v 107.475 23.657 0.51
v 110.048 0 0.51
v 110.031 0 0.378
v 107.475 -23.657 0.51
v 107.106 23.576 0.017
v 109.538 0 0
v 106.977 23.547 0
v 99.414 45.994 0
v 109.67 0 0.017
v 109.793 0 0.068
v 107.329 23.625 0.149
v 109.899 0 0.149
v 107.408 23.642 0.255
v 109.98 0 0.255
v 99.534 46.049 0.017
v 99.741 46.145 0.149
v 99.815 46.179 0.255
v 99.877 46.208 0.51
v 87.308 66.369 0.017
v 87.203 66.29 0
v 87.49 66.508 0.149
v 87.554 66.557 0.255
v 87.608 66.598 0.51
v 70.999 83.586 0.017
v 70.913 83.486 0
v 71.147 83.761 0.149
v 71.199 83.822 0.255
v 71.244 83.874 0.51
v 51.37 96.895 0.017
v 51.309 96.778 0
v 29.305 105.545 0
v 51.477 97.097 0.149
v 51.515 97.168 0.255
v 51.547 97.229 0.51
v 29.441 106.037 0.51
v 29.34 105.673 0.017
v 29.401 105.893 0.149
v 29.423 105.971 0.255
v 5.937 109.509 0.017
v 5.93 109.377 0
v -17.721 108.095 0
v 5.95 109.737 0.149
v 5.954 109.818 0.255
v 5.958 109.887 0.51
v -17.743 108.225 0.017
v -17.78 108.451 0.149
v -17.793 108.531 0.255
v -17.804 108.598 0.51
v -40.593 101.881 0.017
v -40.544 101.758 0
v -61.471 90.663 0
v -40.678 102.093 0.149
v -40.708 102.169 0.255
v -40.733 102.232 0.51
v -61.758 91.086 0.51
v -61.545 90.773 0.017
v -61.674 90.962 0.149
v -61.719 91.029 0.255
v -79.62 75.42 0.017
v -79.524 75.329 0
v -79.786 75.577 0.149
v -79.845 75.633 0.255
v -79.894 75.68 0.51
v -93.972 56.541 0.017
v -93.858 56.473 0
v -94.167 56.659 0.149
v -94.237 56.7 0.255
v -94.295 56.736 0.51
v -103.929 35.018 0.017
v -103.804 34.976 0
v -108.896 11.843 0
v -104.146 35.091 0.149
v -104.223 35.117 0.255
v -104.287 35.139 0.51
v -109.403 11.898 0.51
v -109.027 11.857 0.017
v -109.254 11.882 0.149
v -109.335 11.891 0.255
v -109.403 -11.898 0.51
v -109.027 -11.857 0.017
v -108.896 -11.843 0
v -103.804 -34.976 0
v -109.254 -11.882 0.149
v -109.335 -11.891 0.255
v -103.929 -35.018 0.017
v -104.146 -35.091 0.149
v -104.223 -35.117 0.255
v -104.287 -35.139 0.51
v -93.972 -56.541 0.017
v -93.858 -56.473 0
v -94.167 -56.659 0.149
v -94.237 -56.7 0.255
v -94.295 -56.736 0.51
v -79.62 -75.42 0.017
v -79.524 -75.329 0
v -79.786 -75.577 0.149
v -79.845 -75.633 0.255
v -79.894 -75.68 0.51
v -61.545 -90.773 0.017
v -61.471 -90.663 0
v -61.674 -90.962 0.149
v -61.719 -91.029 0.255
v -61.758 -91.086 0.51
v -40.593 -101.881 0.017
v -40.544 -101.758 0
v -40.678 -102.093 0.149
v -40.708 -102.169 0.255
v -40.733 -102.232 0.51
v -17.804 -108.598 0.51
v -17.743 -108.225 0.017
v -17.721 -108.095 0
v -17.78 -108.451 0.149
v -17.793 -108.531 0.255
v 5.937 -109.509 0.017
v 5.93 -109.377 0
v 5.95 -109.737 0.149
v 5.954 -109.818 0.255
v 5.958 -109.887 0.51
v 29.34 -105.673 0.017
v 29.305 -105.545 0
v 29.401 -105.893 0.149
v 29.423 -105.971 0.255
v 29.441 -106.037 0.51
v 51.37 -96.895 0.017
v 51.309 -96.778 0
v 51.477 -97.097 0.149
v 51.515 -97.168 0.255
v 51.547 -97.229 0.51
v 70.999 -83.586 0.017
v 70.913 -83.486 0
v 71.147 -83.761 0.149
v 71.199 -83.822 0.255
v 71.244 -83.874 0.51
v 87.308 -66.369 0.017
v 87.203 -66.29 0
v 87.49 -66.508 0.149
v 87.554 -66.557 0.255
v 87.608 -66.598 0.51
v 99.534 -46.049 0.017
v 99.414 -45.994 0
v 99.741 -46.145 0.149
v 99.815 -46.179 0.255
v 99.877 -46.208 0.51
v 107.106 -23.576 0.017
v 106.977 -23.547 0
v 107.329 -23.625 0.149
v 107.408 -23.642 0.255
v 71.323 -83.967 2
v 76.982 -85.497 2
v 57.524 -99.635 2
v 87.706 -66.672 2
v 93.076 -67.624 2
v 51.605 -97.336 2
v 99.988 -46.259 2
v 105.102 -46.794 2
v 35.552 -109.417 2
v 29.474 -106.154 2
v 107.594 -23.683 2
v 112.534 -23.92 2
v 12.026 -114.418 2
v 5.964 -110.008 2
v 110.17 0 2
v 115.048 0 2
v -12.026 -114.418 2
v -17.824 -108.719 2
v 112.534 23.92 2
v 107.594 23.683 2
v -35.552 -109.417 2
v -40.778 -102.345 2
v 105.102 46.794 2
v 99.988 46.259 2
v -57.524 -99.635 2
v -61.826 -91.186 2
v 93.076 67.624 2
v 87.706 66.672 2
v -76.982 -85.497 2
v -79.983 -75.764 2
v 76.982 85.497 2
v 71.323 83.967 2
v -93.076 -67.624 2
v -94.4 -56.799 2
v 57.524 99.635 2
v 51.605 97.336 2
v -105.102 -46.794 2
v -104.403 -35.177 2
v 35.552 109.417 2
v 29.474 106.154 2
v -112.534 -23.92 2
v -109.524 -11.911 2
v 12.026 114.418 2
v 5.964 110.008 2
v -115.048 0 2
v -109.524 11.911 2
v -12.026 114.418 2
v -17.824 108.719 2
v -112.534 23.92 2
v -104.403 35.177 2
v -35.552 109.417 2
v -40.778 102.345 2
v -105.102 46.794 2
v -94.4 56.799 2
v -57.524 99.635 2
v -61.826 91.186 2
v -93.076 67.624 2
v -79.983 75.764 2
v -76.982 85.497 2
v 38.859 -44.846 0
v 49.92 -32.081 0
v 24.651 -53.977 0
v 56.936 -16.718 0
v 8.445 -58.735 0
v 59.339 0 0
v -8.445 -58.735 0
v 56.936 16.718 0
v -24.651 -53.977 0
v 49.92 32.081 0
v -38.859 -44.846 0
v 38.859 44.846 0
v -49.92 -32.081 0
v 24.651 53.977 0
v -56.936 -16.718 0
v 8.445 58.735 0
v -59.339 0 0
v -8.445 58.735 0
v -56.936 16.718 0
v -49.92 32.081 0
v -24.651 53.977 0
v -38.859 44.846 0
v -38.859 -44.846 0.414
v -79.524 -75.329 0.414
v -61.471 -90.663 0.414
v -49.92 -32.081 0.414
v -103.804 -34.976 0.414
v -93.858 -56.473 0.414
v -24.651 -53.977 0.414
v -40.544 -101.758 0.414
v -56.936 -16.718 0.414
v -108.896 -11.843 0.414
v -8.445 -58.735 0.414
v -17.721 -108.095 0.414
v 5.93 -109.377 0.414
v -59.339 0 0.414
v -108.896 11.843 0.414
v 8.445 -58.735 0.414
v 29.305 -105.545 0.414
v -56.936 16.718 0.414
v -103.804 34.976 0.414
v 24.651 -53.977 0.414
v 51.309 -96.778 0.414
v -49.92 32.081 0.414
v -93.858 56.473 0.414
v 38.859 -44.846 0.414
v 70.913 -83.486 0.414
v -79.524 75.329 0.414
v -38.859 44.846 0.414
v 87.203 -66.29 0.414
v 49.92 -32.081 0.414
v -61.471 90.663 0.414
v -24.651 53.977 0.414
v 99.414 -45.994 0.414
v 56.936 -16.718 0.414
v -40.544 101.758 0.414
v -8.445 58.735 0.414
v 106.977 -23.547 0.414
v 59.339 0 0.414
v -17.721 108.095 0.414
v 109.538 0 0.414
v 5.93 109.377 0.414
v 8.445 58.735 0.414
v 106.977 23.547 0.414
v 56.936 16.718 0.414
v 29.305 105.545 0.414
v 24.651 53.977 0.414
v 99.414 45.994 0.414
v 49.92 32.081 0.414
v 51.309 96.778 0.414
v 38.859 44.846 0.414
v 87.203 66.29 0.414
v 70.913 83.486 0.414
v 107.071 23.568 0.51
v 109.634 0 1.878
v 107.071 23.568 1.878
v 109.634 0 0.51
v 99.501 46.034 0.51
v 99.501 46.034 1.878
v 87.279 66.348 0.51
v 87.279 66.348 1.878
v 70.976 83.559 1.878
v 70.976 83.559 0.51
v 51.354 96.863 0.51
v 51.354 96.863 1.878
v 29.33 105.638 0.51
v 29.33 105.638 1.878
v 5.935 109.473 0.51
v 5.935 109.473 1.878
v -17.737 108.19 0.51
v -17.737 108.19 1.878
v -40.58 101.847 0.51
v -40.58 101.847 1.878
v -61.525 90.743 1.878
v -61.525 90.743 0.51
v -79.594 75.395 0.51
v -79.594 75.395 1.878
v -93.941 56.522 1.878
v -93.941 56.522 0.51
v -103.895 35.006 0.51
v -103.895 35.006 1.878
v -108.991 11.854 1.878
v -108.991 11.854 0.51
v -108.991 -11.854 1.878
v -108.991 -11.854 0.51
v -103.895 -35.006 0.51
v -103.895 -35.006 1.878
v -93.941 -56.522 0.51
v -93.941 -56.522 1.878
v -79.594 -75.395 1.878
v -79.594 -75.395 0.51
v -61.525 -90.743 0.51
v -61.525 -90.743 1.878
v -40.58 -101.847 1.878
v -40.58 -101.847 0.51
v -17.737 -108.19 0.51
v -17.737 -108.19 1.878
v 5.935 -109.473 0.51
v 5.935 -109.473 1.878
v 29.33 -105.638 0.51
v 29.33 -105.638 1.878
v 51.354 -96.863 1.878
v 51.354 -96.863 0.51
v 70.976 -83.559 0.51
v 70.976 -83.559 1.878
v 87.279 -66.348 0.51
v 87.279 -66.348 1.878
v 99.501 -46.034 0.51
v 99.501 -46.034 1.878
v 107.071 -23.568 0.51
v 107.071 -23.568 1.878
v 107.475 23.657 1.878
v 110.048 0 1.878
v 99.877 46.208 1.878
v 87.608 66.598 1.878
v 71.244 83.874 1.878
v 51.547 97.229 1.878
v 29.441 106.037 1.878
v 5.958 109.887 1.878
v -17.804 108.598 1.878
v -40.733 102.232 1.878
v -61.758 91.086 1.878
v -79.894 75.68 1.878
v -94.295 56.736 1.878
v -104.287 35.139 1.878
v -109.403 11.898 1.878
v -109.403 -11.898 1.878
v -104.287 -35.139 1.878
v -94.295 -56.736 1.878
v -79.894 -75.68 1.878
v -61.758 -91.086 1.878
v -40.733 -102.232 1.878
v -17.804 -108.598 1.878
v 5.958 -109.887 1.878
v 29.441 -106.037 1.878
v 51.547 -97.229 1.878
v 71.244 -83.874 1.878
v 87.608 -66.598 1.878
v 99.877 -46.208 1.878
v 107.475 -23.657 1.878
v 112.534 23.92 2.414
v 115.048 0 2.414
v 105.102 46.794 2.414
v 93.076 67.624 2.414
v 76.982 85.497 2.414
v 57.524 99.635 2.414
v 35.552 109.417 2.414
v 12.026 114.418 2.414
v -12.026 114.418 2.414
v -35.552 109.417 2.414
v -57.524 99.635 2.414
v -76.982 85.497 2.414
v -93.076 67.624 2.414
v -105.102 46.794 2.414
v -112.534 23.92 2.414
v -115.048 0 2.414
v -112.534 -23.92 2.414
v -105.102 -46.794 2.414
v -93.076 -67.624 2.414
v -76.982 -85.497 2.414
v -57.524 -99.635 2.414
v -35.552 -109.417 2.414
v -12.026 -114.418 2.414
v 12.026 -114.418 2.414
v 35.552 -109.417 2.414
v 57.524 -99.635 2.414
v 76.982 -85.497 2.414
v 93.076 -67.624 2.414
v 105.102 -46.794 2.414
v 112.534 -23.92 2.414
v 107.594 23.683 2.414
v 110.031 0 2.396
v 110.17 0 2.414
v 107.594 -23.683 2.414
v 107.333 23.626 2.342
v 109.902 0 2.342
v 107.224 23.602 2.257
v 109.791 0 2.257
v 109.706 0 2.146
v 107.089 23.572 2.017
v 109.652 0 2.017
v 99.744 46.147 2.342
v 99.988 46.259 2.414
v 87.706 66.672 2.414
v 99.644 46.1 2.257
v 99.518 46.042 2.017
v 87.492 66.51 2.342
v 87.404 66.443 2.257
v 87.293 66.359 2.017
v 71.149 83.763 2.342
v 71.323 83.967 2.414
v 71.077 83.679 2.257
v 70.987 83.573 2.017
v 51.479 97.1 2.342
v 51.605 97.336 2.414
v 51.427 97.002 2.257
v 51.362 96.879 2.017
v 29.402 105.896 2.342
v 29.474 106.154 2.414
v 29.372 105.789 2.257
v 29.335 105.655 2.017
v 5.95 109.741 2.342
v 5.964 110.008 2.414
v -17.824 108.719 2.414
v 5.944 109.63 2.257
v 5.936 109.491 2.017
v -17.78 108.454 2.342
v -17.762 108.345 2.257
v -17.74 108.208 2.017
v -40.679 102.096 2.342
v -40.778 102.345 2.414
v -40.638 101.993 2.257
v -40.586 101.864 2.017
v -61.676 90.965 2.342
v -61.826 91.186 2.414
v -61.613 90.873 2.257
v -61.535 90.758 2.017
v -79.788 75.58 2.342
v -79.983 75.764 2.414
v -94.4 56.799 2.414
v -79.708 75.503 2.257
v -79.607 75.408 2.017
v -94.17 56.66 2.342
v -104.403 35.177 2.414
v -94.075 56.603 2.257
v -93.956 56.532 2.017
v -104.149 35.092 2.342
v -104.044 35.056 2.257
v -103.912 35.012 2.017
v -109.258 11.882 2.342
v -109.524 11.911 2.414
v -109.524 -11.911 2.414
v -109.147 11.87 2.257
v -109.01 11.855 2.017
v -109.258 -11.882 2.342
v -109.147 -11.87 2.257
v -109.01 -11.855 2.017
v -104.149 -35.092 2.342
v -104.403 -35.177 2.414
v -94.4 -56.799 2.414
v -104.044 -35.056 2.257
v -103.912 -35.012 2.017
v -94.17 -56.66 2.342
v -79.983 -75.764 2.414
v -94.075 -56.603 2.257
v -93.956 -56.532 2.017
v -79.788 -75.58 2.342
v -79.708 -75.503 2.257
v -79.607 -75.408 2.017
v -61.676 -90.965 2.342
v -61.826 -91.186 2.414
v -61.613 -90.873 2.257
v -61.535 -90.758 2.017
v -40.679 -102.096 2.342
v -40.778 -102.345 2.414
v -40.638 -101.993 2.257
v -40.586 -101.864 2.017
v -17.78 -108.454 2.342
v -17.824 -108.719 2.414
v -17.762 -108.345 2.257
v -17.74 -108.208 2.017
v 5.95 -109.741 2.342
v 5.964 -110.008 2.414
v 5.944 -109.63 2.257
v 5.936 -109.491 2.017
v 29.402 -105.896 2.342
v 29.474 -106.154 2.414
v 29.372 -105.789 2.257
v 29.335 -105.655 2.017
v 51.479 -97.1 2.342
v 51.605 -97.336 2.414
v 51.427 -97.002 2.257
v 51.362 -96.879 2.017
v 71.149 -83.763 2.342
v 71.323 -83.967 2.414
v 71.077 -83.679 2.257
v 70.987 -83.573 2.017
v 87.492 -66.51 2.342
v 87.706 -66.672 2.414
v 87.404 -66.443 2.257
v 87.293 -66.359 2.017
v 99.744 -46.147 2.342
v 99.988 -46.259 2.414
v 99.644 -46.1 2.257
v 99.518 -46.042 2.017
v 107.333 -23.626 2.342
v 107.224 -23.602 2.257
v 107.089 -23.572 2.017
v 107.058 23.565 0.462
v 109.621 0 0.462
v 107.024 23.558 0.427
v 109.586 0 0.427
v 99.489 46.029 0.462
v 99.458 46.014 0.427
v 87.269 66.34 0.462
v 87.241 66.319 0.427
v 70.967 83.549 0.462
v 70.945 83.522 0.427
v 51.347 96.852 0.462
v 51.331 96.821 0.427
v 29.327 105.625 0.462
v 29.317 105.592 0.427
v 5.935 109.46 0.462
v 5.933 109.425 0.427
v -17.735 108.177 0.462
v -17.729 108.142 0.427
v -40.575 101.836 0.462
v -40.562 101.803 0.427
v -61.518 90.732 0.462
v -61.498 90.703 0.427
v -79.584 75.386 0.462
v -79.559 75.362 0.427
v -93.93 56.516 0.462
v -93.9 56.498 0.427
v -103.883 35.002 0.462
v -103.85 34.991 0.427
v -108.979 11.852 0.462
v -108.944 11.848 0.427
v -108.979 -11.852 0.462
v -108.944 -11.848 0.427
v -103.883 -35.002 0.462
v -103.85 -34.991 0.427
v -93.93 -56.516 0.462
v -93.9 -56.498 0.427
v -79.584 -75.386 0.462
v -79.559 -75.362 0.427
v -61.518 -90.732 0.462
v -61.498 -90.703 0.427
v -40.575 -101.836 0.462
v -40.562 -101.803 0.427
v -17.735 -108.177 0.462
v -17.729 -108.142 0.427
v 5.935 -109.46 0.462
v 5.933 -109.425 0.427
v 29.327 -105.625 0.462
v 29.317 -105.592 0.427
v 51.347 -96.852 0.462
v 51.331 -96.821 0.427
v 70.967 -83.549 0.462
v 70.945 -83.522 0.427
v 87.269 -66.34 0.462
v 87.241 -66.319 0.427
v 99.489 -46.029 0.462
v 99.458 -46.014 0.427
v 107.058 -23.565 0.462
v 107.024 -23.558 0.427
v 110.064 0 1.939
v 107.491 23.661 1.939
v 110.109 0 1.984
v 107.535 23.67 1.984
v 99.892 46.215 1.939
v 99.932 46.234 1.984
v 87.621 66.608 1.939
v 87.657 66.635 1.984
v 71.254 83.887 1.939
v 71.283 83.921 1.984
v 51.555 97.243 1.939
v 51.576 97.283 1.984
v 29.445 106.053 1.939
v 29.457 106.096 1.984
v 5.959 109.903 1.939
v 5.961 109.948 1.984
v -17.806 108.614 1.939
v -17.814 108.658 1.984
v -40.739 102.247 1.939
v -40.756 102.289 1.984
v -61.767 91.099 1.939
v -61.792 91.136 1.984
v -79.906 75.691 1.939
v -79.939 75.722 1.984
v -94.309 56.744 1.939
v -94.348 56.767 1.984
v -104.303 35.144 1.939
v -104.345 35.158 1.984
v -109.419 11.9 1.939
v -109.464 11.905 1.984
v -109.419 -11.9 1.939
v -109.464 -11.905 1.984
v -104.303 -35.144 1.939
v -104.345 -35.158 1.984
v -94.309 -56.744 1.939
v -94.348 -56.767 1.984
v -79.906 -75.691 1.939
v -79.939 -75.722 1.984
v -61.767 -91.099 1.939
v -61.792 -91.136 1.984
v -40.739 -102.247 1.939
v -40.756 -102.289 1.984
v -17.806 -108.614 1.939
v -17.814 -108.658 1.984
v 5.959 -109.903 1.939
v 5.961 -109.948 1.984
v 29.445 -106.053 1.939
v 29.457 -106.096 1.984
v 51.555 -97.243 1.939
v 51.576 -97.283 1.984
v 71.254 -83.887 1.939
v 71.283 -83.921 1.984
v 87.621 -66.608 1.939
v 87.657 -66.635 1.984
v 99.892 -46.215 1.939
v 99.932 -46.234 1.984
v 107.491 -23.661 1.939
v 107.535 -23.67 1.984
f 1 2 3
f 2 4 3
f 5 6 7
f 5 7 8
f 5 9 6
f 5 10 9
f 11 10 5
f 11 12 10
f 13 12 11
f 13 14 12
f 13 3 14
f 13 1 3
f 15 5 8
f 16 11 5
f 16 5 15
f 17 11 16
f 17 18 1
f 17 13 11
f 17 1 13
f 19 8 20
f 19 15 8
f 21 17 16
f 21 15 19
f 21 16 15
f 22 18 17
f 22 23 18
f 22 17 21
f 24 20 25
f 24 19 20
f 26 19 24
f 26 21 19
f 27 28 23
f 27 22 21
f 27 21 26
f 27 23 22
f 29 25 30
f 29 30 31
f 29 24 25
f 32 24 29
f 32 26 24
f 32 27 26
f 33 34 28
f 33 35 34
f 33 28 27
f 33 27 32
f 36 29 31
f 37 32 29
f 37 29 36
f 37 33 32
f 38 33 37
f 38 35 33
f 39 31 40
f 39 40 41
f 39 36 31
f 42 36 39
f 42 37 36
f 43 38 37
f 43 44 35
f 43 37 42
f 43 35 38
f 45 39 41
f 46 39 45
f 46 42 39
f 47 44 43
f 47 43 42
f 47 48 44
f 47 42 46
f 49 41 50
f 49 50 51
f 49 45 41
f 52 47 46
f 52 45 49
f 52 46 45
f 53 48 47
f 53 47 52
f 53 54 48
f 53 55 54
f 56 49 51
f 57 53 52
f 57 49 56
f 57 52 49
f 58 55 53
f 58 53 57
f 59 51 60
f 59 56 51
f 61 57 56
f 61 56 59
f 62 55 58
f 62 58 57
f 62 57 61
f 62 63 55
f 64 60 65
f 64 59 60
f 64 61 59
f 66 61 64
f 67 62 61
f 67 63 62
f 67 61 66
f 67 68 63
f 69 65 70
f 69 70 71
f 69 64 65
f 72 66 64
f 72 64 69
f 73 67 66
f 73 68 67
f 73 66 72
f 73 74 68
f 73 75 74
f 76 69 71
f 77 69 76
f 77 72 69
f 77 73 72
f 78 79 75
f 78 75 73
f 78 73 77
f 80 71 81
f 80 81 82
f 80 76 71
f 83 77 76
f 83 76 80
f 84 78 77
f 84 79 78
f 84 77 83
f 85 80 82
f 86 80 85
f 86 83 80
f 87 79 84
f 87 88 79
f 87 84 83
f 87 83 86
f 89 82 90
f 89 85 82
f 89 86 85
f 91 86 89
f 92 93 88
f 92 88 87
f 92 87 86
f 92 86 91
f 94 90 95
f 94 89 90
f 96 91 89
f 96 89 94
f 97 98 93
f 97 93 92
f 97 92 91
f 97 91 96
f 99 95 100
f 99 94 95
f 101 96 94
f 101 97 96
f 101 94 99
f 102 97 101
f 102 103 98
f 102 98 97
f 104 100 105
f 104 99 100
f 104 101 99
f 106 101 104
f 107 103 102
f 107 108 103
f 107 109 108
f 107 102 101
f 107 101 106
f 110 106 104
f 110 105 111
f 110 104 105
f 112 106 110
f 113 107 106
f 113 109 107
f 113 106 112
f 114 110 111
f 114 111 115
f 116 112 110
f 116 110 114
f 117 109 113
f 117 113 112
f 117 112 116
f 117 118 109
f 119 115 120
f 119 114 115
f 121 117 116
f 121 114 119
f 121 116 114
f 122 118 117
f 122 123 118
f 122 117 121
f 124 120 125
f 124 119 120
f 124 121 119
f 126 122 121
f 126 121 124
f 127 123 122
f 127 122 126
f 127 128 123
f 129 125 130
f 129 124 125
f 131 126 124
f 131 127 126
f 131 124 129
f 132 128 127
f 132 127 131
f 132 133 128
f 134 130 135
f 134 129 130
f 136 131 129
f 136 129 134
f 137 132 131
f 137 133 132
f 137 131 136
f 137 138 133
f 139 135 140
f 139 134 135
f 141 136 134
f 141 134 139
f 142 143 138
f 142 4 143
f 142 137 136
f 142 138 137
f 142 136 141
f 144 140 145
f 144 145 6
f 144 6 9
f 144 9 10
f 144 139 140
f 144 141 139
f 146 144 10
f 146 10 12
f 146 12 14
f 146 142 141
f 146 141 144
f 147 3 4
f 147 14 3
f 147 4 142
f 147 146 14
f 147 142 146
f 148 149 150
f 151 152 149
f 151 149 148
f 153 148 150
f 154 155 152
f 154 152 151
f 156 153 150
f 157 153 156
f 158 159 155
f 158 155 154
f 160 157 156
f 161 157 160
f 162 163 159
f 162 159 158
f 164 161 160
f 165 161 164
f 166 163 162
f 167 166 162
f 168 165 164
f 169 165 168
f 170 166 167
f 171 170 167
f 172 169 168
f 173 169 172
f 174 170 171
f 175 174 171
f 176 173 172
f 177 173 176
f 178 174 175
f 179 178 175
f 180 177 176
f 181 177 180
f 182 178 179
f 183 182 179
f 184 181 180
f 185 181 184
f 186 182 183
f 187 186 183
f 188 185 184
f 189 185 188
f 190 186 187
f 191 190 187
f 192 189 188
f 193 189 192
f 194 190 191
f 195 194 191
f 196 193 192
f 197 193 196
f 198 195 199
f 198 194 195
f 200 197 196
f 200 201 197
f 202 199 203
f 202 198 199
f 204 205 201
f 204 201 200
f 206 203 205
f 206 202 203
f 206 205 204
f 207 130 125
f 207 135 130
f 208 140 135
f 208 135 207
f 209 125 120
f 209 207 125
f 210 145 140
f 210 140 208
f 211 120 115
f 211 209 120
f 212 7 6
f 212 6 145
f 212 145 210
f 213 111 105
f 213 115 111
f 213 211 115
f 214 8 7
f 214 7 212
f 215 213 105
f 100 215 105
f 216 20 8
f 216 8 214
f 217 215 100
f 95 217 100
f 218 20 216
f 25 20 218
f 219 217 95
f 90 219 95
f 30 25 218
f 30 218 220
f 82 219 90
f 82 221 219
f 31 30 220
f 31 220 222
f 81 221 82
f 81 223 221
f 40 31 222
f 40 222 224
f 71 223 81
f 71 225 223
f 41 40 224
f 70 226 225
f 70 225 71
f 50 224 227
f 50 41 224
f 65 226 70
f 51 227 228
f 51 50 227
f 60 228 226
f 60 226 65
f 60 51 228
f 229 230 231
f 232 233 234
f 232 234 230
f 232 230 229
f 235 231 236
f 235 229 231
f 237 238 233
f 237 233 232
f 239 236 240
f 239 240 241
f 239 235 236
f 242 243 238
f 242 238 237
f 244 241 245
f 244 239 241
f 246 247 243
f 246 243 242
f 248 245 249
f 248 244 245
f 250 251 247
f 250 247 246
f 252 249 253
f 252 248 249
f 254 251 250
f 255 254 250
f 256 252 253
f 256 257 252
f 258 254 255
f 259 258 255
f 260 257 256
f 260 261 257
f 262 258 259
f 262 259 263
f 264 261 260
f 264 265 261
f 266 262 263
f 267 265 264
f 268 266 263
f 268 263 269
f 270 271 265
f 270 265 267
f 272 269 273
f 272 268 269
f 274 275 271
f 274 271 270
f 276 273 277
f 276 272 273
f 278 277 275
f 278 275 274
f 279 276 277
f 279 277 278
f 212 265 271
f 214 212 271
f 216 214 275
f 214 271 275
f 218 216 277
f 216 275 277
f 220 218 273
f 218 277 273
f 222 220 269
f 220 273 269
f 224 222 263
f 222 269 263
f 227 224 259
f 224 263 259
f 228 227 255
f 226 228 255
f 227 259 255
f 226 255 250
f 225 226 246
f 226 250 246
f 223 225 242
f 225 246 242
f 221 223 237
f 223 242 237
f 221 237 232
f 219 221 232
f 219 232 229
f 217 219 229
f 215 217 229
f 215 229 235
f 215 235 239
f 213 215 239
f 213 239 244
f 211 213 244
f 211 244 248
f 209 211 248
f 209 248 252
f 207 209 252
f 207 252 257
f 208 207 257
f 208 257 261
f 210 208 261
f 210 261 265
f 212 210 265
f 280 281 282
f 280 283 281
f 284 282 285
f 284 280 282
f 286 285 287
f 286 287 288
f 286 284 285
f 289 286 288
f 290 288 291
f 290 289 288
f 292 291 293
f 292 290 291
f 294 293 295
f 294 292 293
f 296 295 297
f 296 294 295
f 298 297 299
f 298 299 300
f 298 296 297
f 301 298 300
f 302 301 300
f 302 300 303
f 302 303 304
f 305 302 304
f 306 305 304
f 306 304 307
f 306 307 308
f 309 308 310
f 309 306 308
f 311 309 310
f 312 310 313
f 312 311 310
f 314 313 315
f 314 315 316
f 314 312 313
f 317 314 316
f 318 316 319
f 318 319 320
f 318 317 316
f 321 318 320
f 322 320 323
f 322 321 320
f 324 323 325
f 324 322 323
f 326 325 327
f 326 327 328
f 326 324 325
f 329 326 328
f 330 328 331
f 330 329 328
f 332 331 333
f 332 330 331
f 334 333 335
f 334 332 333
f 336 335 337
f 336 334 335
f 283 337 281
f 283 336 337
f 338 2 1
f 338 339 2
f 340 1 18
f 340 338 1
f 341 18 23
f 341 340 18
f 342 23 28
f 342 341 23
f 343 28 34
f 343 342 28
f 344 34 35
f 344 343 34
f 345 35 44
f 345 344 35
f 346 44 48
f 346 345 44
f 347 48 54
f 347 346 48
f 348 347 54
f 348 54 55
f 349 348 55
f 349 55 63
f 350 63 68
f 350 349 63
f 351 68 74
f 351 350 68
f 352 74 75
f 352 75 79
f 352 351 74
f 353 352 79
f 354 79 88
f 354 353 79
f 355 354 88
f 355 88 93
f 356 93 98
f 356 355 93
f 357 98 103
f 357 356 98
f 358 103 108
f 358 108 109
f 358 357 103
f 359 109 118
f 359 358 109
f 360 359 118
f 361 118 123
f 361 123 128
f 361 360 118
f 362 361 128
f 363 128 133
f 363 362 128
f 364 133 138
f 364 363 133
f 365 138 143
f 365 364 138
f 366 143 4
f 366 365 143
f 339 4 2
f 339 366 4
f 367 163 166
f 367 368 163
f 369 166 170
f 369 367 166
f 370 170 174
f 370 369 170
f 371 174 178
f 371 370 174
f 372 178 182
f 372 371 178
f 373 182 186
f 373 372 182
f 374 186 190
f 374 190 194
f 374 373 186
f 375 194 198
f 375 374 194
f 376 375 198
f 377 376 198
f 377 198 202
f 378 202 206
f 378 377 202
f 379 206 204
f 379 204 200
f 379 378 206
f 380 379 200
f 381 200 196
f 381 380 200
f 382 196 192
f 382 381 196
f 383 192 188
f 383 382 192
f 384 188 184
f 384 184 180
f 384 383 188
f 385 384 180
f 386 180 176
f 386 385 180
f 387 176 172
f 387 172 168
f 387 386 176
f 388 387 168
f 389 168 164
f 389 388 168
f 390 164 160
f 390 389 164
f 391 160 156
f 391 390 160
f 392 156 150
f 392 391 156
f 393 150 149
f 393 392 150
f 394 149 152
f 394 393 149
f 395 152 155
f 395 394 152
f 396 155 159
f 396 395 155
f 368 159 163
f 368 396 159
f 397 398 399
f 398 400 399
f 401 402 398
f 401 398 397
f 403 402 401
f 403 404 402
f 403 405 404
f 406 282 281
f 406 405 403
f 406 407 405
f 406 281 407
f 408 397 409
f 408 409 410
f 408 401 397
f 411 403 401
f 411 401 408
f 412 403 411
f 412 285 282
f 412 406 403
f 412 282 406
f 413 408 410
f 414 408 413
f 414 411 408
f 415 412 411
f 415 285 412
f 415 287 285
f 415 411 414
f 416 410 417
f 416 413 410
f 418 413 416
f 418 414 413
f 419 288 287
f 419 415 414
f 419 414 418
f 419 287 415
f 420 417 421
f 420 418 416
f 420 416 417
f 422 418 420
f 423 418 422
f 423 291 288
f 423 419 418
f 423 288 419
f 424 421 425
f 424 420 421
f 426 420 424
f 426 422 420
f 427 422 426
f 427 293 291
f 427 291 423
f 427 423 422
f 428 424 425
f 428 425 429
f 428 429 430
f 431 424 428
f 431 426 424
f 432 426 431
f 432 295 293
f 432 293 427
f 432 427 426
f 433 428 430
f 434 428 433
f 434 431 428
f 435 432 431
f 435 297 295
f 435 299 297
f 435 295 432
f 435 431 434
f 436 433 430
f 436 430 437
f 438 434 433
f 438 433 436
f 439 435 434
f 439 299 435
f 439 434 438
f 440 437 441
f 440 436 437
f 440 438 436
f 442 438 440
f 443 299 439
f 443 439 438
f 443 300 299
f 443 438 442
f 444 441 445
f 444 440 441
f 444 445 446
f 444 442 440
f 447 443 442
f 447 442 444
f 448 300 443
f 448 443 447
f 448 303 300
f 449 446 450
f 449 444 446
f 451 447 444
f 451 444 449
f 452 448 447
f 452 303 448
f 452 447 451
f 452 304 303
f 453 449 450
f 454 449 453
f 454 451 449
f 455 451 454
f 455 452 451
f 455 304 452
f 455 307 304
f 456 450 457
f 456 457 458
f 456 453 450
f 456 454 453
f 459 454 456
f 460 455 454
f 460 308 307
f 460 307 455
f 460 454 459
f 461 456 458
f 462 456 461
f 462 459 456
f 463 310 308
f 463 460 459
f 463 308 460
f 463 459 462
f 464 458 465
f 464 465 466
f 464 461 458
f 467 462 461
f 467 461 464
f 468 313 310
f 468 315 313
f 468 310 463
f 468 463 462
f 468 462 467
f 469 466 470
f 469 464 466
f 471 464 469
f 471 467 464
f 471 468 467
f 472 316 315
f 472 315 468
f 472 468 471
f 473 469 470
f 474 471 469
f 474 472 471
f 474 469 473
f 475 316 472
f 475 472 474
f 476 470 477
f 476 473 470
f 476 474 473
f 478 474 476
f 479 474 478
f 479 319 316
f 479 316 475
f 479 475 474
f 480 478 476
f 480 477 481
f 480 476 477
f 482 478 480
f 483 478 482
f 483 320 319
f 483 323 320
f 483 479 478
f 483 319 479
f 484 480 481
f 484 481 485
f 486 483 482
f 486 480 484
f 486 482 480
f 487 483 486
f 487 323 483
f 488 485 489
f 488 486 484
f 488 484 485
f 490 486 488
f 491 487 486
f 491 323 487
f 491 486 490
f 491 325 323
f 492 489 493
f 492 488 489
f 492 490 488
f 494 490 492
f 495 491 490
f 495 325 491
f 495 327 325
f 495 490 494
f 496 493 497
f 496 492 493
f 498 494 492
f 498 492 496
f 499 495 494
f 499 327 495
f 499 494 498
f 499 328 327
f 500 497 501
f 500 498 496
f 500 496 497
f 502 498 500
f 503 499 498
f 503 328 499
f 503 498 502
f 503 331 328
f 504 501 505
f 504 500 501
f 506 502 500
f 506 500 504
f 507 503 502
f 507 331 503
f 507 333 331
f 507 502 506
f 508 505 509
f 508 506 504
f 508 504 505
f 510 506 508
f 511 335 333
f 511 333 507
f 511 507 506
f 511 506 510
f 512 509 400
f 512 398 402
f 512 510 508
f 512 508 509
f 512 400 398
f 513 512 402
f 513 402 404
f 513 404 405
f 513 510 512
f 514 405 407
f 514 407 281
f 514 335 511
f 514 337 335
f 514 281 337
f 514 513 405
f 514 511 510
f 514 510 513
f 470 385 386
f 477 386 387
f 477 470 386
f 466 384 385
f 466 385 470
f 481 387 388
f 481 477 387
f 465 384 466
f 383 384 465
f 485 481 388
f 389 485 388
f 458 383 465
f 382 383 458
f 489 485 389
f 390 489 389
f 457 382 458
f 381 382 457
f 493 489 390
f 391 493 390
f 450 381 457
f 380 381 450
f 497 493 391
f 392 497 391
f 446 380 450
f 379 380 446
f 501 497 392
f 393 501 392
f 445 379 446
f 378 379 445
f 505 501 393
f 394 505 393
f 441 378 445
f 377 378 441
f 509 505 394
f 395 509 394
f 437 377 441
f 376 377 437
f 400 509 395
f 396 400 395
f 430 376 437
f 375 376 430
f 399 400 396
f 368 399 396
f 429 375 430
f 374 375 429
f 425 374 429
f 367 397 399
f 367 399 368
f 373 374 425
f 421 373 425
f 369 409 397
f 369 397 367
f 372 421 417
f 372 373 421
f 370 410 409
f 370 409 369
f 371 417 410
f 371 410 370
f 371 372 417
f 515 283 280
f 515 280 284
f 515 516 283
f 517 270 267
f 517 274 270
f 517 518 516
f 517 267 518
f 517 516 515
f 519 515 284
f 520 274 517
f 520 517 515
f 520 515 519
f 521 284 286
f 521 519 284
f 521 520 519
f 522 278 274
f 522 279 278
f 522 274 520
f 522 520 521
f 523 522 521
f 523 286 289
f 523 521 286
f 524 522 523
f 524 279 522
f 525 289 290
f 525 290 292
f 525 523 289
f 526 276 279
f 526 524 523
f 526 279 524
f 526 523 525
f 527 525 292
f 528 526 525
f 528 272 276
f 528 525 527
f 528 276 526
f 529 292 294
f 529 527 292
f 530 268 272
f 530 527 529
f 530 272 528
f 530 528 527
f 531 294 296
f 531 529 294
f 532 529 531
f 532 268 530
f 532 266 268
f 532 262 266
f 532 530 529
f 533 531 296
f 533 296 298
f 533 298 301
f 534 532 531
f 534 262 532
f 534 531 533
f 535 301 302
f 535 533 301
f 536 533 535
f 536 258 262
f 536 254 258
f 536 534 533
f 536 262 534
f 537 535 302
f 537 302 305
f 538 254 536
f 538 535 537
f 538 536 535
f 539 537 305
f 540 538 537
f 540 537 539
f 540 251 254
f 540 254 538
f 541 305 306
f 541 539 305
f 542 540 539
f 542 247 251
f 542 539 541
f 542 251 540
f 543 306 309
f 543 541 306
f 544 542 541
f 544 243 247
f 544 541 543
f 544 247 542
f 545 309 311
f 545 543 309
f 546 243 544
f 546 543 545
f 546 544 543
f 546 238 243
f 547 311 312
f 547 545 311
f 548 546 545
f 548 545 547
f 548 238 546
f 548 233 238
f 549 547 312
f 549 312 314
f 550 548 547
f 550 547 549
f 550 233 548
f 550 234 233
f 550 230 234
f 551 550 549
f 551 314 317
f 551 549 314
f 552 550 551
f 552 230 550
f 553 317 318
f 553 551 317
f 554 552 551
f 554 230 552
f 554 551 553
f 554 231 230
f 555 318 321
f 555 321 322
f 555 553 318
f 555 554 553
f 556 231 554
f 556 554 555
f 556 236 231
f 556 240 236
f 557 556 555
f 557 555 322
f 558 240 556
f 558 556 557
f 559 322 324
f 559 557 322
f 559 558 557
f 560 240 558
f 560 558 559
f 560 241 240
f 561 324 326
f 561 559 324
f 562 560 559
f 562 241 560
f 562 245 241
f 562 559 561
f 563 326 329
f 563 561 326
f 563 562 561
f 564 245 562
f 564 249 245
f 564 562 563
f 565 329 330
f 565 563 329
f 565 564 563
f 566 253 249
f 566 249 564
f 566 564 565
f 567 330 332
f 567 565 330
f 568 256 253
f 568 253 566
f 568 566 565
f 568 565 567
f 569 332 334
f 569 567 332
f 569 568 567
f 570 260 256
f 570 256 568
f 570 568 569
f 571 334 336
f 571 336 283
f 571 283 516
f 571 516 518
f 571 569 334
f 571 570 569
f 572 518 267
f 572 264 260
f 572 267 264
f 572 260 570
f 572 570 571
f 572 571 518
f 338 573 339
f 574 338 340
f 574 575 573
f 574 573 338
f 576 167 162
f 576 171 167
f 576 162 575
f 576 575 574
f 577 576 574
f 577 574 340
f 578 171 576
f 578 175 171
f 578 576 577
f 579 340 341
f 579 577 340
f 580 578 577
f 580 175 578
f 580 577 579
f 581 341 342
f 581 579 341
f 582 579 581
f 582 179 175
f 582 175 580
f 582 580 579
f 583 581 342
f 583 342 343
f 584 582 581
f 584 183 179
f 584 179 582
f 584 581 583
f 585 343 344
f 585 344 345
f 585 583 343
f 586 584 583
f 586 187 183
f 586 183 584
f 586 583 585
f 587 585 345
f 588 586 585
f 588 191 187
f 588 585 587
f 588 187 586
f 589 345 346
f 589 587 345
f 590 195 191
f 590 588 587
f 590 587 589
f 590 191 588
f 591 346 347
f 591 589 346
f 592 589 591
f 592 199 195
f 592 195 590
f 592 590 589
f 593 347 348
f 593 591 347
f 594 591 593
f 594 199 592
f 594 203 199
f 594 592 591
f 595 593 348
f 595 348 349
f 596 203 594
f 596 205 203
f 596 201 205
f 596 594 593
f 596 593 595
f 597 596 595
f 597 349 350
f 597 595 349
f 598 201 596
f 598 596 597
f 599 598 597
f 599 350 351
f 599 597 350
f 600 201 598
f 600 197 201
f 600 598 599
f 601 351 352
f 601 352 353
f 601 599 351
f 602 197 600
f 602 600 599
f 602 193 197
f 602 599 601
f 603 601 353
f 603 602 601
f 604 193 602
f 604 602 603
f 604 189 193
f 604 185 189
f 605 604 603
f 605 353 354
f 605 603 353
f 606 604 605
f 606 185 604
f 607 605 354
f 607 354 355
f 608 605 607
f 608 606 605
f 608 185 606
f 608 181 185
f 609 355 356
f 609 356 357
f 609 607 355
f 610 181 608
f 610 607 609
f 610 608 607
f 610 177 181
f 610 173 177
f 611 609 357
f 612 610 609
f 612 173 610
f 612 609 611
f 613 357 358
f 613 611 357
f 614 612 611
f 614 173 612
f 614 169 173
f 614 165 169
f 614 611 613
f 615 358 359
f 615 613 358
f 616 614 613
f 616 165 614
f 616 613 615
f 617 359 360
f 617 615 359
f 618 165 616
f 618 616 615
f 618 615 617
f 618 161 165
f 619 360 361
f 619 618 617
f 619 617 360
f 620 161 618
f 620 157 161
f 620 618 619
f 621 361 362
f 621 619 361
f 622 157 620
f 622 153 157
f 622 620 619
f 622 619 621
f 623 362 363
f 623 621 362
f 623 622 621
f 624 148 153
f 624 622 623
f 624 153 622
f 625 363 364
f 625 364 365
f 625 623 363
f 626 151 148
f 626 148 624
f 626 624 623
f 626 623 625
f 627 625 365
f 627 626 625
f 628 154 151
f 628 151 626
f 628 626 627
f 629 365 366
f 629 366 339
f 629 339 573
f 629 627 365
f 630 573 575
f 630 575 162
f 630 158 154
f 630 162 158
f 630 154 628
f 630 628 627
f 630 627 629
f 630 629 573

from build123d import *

# Parameters (mm, degrees)
F2_R     = 59.33948
F3_DEPTH = 25.4


with BuildPart() as f1:
    # F0 (on Front) → F1 (revolve)
    with BuildSketch(Plane.XZ):
        with BuildLine():
            Line((0, 0.414), (0, 0))
            Line((0, 0), (109.538073, 0))
            ThreePointArc((109.538073, 0), (109.89867, 0.149364), (110.048034, 0.509961))
            Line((110.048034, 0.509961), (110.048034, 1.878083))
            ThreePointArc((110.048034, 1.878083), (110.08374, 1.964284), (110.16994, 1.999989))
            Line((110.16994, 1.999989), (110.827769, 1.999989))
            Line((110.827769, 1.999989), (115.048034, 1.999989))
            Line((115.048034, 1.999989), (115.048034, 2.413989))
            Line((115.048034, 2.413989), (110.169929, 2.413989))
            ThreePointArc((110.169929, 2.413989), (109.790994, 2.257029), (109.634034, 1.878094))
            Line((109.634034, 1.878094), (109.634034, 0.509955))
            ThreePointArc((109.634034, 0.509955), (109.60593, 0.442105), (109.538079, 0.414))
            Line((109.538079, 0.414), (0, 0.414))
        make_face()
    revolve(axis=Axis((0, 0, 0.207), (0, 0, 1)))

    # F2 (on face) → F3 (cut)
    with BuildSketch(Plane.XY.offset(0.414)):
        Circle(F2_R)
    extrude(amount=-F3_DEPTH, mode=Mode.SUBTRACT)


solid = f1.part
